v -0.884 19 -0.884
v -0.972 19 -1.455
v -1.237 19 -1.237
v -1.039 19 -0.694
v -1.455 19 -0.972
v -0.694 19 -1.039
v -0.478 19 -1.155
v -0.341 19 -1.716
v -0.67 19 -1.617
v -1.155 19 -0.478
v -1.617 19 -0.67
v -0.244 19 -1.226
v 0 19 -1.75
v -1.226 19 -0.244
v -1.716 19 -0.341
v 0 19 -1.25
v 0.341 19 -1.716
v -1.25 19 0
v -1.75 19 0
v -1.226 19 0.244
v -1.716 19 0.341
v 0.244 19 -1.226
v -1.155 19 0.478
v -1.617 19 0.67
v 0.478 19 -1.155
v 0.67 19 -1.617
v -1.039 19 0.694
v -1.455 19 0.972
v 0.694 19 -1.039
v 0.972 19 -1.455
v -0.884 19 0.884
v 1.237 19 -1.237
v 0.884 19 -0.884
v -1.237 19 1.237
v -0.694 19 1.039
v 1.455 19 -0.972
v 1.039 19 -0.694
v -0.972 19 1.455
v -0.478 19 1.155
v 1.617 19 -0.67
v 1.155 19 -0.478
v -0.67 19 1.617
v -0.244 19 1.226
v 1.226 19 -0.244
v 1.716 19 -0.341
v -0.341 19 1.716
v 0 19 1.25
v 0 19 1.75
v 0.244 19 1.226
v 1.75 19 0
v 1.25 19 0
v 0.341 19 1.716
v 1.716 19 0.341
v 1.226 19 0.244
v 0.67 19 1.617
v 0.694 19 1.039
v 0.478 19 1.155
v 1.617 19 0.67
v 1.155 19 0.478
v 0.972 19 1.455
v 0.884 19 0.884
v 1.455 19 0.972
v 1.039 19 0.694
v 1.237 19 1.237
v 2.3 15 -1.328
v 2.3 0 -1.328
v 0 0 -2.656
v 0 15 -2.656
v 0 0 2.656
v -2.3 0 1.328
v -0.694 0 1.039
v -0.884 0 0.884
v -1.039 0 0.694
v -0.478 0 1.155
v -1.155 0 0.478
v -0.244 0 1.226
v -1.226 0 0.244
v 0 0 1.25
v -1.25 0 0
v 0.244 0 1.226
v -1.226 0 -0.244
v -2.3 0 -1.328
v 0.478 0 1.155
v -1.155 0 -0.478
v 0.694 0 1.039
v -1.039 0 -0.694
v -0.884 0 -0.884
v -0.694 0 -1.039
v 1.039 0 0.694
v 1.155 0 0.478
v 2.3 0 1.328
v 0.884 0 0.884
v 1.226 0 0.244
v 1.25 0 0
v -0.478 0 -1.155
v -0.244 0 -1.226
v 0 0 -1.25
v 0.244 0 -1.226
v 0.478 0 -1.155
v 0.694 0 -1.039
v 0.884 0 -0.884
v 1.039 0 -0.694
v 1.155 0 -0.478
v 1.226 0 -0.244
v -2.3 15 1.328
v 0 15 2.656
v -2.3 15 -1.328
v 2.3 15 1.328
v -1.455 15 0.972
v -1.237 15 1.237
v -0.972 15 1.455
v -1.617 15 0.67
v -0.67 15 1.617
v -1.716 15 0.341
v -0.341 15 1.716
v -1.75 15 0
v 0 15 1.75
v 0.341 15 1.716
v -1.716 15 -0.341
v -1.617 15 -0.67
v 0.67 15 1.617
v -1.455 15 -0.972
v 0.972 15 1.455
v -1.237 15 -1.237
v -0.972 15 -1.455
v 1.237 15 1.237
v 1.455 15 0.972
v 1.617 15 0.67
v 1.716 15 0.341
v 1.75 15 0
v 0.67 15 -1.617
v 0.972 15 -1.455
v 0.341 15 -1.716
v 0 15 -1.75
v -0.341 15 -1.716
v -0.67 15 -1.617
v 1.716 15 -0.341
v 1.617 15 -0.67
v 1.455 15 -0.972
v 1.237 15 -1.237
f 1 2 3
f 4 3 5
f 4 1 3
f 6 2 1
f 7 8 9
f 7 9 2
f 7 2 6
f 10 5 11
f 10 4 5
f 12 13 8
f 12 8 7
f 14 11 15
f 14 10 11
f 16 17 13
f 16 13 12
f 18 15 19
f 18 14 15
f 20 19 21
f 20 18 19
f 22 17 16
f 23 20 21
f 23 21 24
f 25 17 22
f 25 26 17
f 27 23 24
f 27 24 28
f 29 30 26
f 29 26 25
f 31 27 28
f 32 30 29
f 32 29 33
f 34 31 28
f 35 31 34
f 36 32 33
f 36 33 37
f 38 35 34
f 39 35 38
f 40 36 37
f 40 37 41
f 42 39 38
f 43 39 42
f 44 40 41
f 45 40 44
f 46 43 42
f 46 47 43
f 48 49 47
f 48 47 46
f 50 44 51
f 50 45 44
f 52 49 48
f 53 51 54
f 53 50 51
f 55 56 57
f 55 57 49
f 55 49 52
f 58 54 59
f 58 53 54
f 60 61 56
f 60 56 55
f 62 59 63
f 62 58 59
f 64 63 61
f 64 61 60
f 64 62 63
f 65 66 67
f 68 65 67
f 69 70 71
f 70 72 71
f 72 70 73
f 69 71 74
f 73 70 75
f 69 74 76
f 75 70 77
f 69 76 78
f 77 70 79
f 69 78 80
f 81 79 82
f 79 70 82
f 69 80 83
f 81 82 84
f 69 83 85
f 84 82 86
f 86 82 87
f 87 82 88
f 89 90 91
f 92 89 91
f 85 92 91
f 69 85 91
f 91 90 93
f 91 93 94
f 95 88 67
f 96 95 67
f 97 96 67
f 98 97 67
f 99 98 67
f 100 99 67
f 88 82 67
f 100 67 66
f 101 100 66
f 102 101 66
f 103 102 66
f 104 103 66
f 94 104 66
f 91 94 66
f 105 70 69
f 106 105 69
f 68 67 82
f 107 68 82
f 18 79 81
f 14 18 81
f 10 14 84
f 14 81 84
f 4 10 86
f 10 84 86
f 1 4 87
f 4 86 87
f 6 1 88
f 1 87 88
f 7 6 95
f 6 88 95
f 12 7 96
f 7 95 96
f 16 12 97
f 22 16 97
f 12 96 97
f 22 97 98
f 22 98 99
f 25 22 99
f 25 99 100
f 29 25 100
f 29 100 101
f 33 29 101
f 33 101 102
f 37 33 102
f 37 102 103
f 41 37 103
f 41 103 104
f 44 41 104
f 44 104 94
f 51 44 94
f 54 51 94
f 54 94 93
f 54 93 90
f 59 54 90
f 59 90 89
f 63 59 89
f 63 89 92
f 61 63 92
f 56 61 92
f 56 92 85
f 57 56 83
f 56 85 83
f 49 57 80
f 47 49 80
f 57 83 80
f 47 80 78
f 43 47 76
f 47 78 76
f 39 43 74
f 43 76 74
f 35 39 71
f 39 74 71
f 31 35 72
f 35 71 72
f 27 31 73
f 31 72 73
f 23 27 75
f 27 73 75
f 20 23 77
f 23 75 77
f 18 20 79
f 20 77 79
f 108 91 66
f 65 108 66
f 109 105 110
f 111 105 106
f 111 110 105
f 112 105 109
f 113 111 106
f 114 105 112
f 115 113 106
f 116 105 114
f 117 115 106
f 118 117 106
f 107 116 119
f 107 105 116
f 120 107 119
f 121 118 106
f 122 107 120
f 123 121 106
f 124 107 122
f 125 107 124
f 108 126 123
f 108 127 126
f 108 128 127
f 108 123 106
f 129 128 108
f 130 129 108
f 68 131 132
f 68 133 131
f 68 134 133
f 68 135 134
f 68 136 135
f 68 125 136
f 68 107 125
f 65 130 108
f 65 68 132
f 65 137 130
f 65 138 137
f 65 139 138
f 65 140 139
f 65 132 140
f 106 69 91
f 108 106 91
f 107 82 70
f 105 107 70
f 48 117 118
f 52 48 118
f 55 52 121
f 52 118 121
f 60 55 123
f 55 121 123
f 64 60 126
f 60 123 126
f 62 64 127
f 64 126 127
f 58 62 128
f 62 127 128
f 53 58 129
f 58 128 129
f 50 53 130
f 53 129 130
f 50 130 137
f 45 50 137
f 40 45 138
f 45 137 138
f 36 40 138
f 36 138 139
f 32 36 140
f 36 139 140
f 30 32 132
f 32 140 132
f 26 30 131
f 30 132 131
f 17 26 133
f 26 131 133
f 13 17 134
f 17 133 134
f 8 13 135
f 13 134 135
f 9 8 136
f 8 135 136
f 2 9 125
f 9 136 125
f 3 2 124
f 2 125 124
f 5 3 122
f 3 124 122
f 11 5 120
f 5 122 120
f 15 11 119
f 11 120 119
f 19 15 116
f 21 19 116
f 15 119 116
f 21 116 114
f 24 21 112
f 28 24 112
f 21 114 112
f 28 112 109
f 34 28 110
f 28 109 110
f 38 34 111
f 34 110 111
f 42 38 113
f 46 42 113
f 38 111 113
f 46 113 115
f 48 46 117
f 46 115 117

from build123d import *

# Parameters (mm, degrees)
EXTRUDE_1_DEPTH    = 15
SKETCH_2_R         = 1.75
EXTRUDE_2_DEPTH    = 4
HOLE_WIZARD_M3_1_D = 2.5


with BuildPart() as part:
    # 草图1 → 凸台-拉伸1 (new body)
    with BuildSketch(Plane(origin=(0, 0, 0), x_dir=(1, 0, 0), z_dir=(0, 1, 0))):
        Polygon((0, 2.655811238), (-2.3, 1.327905619), (-2.3, -1.327905619), (0, -2.655811238), (2.3, -1.327905619), (2.3, 1.327905619), align=None)
    extrude(amount=EXTRUDE_1_DEPTH)

    # 草图2 → 凸台-拉伸2 (add)
    with BuildSketch(Plane(origin=(0, 15, 0), x_dir=(1, 0, 0), z_dir=(0, 1, 0))):
        with Locations(Location((0, 0, 0), (0, 0, 270))):
            Circle(SKETCH_2_R)
    extrude(amount=EXTRUDE_2_DEPTH)

    # M3 螺纹孔1 (through all)
    with Locations(Plane(origin=(0, 19, 0), x_dir=(1, 0, 0), z_dir=(0, 1, 0))):
        with Locations((0, 0)):
            Hole(HOLE_WIZARD_M3_1_D / 2)


solid = part.part
